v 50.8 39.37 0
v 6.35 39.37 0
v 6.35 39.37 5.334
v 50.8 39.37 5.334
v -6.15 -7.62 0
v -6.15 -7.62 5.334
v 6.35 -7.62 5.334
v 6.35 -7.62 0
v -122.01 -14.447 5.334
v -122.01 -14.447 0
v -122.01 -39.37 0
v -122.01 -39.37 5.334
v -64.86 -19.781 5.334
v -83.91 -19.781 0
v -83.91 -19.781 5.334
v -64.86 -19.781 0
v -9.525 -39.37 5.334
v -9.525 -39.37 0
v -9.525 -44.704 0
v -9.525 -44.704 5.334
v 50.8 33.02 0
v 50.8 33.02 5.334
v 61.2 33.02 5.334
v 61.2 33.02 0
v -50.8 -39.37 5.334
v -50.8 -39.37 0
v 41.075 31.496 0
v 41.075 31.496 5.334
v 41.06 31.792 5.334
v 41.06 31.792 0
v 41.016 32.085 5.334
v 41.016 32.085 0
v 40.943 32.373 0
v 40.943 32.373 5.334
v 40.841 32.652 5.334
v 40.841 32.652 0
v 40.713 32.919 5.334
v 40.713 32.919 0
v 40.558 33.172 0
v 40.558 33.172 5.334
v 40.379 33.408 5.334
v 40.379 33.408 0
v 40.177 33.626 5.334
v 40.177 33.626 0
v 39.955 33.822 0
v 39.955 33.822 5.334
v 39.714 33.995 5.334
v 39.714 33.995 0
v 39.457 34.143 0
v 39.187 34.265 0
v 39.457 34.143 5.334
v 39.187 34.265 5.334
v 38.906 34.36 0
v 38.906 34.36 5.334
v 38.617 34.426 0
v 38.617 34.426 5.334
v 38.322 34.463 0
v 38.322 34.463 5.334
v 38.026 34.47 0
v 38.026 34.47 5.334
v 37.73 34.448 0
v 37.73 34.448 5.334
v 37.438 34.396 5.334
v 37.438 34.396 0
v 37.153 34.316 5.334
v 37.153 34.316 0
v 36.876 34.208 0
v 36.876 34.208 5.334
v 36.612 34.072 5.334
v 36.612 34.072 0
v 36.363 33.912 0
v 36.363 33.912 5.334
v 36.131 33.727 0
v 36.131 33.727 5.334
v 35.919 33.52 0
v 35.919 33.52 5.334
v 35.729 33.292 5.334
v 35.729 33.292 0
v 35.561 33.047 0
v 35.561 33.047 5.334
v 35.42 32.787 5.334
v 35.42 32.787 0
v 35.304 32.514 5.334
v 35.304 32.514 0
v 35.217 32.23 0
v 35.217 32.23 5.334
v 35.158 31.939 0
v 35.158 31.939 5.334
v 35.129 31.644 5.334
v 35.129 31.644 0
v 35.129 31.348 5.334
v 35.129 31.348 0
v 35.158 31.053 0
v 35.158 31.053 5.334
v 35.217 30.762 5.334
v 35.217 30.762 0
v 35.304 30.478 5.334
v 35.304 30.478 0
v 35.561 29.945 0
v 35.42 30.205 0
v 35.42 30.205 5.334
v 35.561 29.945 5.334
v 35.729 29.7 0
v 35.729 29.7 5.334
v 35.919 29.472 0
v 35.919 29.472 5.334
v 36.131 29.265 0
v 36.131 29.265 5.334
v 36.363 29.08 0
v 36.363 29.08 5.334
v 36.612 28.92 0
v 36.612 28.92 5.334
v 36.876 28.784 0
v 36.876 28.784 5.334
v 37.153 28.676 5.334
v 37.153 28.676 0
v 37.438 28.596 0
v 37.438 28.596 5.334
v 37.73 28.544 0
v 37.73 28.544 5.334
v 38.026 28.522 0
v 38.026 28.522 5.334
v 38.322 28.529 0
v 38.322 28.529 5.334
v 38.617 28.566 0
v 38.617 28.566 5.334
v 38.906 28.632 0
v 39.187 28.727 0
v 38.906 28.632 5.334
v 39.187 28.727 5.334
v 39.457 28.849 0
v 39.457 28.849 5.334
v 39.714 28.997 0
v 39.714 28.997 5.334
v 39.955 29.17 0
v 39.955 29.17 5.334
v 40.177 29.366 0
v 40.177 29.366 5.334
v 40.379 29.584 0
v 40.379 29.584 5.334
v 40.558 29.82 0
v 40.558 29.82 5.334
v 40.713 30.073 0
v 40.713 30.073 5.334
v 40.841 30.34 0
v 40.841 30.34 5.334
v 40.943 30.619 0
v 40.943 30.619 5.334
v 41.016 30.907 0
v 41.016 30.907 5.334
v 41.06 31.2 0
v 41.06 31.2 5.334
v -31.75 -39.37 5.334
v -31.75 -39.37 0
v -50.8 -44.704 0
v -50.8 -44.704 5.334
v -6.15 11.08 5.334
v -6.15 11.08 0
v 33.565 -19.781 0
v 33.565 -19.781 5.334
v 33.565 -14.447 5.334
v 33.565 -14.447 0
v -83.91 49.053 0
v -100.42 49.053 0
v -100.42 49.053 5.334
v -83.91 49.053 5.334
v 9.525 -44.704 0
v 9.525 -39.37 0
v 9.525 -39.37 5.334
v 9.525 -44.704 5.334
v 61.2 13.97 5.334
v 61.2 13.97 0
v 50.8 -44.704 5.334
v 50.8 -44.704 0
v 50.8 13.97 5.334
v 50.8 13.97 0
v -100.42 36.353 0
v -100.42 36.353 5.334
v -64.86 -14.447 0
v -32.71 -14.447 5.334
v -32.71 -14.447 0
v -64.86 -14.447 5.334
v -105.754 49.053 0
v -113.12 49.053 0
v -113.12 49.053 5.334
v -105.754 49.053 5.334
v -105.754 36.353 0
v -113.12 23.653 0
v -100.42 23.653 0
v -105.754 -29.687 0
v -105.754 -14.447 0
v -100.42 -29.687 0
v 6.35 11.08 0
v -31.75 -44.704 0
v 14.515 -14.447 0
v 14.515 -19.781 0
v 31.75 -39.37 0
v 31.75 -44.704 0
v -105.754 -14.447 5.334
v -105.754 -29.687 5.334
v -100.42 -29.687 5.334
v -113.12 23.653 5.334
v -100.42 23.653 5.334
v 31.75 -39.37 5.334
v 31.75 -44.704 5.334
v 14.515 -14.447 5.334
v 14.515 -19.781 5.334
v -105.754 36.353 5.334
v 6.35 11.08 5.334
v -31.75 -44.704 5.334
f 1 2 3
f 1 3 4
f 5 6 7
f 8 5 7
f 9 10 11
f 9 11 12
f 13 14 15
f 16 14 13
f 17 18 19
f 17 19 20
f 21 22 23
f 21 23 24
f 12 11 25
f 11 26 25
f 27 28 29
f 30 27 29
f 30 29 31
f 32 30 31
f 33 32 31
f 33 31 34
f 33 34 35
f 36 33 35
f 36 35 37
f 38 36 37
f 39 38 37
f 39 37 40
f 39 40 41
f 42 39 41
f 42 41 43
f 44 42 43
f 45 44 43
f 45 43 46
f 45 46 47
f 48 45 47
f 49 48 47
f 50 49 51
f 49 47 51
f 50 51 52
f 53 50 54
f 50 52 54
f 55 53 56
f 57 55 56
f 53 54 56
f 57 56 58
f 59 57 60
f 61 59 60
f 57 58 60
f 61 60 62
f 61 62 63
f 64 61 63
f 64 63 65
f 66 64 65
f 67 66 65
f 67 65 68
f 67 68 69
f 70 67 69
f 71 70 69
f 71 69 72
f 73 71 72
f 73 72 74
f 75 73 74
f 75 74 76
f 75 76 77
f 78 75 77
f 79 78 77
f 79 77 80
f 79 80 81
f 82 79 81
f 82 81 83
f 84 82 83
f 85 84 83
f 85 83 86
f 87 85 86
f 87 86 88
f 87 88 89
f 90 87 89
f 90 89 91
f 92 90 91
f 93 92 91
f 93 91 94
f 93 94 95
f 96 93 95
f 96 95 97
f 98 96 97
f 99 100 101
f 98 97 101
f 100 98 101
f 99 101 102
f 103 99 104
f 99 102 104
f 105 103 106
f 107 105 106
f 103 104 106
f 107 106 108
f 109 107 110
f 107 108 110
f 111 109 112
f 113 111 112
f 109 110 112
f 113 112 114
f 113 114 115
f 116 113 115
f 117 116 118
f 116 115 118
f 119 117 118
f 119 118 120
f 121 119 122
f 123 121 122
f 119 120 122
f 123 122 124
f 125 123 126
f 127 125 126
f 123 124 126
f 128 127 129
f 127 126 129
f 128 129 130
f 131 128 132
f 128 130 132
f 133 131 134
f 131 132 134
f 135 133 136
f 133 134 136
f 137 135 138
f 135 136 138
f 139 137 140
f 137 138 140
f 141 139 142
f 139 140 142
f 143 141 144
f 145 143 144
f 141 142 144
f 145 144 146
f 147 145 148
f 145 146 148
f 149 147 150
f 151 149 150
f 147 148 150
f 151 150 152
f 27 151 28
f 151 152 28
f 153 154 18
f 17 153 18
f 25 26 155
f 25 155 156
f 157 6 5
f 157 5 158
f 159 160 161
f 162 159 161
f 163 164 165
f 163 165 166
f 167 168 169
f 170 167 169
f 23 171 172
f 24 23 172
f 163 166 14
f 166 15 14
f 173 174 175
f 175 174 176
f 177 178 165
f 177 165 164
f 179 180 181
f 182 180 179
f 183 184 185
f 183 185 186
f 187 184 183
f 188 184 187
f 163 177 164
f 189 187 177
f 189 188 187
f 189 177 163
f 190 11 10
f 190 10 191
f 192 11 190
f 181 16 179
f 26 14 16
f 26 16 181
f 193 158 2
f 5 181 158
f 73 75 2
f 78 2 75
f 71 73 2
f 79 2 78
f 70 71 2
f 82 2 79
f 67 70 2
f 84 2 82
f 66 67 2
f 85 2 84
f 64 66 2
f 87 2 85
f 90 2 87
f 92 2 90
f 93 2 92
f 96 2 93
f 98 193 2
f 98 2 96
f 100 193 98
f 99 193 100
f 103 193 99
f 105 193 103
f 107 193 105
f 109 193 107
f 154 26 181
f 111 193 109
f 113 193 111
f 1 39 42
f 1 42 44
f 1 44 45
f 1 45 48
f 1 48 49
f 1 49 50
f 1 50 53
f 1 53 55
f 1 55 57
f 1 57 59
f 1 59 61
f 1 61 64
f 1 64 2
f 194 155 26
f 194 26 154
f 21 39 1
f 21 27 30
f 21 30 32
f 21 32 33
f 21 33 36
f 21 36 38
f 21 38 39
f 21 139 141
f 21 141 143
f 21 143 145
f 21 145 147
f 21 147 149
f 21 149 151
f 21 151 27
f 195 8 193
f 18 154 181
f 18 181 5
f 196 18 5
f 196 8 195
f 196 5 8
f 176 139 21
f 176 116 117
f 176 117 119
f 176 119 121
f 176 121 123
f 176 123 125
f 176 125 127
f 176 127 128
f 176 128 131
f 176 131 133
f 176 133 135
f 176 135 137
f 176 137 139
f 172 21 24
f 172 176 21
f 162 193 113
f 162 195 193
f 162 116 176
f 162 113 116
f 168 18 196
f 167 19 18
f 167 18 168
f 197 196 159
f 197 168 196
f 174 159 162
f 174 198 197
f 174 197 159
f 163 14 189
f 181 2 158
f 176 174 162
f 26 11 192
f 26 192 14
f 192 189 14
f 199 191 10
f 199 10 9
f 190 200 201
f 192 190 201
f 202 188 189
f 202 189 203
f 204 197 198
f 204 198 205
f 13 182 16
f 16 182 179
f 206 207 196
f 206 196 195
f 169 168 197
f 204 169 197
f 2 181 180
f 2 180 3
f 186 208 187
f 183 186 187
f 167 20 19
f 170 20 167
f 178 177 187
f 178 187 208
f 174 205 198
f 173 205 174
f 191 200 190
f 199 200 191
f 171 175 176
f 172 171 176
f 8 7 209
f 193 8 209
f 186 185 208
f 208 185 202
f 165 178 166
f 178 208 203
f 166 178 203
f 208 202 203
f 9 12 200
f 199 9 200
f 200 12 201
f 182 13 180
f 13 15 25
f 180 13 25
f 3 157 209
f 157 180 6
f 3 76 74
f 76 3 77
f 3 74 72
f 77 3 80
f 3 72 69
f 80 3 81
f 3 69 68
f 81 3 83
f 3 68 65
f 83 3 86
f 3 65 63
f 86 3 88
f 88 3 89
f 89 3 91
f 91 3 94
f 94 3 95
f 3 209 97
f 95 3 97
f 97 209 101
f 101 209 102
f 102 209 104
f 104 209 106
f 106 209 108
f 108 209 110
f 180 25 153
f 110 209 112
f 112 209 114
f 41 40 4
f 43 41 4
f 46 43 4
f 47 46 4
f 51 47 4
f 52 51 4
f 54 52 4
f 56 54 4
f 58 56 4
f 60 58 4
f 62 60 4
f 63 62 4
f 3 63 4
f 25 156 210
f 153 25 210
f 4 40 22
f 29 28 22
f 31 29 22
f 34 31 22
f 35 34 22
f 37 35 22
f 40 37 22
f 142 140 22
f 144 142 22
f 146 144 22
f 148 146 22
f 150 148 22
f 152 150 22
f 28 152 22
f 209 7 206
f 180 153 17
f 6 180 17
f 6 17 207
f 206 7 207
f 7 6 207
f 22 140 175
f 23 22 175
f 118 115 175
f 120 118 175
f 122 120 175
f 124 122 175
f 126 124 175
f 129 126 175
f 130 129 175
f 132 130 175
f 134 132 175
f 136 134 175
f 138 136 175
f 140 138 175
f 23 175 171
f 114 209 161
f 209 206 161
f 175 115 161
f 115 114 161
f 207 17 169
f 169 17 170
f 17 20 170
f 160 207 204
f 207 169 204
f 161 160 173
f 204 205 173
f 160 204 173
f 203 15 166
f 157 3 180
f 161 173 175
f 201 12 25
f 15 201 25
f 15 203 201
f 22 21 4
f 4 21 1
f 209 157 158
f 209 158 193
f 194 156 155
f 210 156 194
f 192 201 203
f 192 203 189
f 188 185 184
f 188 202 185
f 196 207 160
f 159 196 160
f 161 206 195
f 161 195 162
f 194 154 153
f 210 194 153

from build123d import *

# Parameters (mm, degrees)
SKETCH2_W                   = 101.6
SKETCH2_H                   = 78.74
SQUARE_DEPTH                = 5.334
SKETCH4_R                   = 2.975000019
SKETCH4_W                   = 19.05
SKETCH4_H                   = 5.334
MOUNTING_POINTS_DEPTH       = 65.490995154
TRICUT_DEPTH                = 65.490995154
TRICUT_DEPTH_BACK           = 65.490995154
SKETCH5_W                   = 19.05
SKETCH5_H                   = 5.334
BOTTOMTEETH_DEPTH           = 5.334
SKETCH8_W                   = 5.334
SKETCH8_H                   = 19.05
GRABBERSTOP_DEPTH           = 10.4
UNOPLATFORM_DEPTH           = 5.334
SKETCH13_W                  = 19.05
SKETCH13_H                  = 5.334
BACKTOOTH_DEPTH             = 5.334
SKETCH14_W                  = 5.334
SKETCH14_H                  = 24.923365698
CIRCUITSTACKEXTENSION_DEPTH = 25.4
SKETCH16_W                  = 5.334
SKETCH16_H                  = 15.24
CIRCUITSTACKHOLDER_DEPTH    = 131.051294604
SKETCH17_W                  = 16.51
SKETCH17_H                  = 5.334
BRACES_DEPTH                = 63.5
SKETCH18_W                  = 5.334
SKETCH18_H                  = 12.7
BRACE2_DEPTH                = 12.7
SKETCH19_W                  = 7.366
SKETCH19_H                  = 5.334
BRACE3_DEPTH                = 12.7
SKETCH20_W                  = 12.499999892
SKETCH20_H                  = 18.7
ON_OFF_SWITCH_DEPTH         = 132.609742414


with BuildPart() as part:
    # Sketch2 → square (new body)
    with BuildSketch(Plane.XY):
        Rectangle(SKETCH2_W, SKETCH2_H)
    extrude(amount=SQUARE_DEPTH)

    # Sketch4 → Mounting points (cut, through all)
    with BuildSketch(Plane.XY.offset(5.334)):
        with Locations((38.1, 31.496)):
            Circle(SKETCH4_R)
        with Locations((24.040000053, -17.113634263)):
            Rectangle(SKETCH4_W, SKETCH4_H)
    extrude(amount=-MOUNTING_POINTS_DEPTH, mode=Mode.SUBTRACT)

    # Sketch3 → tricut (cut, two sides: drawn at the far end of the back side and taken through both)
    with BuildSketch(Plane.XY.offset(5.334).offset(-TRICUT_DEPTH_BACK)):
        Polygon((-207.681606875, -255.517991695), (-50.8, -39.37), (6.35, 39.37), (50.8, 39.37), (317.880124475, 39.37), (56.500793408, 505.211192735), (-469.060937942, 210.323201041), align=None)
    extrude(amount=TRICUT_DEPTH + TRICUT_DEPTH_BACK, mode=Mode.SUBTRACT)

    # Sketch5 → bottomTeeth (add)
    with BuildSketch(Plane.XZ.offset(39.37)):
        with Locations((-41.275, 2.667)):
            Rectangle(SKETCH5_W, SKETCH5_H)
        with Locations((0, 2.667)):
            Rectangle(SKETCH5_W, SKETCH5_H)
        with Locations((41.275, 2.667)):
            Rectangle(SKETCH5_W, SKETCH5_H)
    extrude(amount=BOTTOMTEETH_DEPTH)

    # Sketch8 → GrabberStop (add)
    with BuildSketch(Plane(origin=(50.8, 0, 0), x_dir=(0, 0, -1), z_dir=(1, 0, 0))):
        with Locations((-2.667, 23.495)):
            Rectangle(SKETCH8_W, SKETCH8_H)
    extrude(amount=GRABBERSTOP_DEPTH)

    # Sketch9 → UnoPlatform (add)
    with BuildSketch(Plane.XY.offset(5.334)):
        Polygon((-96.60999982, -39.37), (-50.8, -39.37), (-32.71046038, -14.446634302), (-96.60999982, -14.446634302), align=None)
    extrude(amount=-UNOPLATFORM_DEPTH)

    # Sketch13 → backTooth (cut)
    with BuildSketch(Plane(origin=(0, -14.446634302, 0), x_dir=(1, 0, 0), z_dir=(0, 1, 0))):
        with Locations((-74.38499982, -2.667)):
            Rectangle(SKETCH13_W, SKETCH13_H)
    extrude(amount=-BACKTOOTH_DEPTH, mode=Mode.SUBTRACT)

    # Sketch14 → CircuitStackExtension (add)
    with BuildSketch(Plane.ZY.offset(96.60999982)):
        with Locations((2.667, -26.908317151)):
            Rectangle(SKETCH14_W, SKETCH14_H)
    extrude(amount=CIRCUITSTACKEXTENSION_DEPTH)

    # Sketch16 → CircuitStackHolder (cut, through all)
    with BuildSketch(Plane.XY.offset(5.334)):
        with Locations((-103.08699982, -22.066634302)):
            Rectangle(SKETCH16_W, SKETCH16_H)
    extrude(amount=-CIRCUITSTACKHOLDER_DEPTH, mode=Mode.SUBTRACT)

    # Sketch17 → Braces (add)
    with BuildSketch(Plane(origin=(0, -14.446634302, 0), x_dir=(1, 0, 0), z_dir=(0, 1, 0))):
        with Locations((-92.16499982, -2.667)):
            Rectangle(SKETCH17_W, SKETCH17_H)
    extrude(amount=BRACES_DEPTH)

    # Sketch18 → Brace2 (add)
    with BuildSketch(Plane.ZY.offset(100.41999982)):
        with Locations((2.667, 30.003365698)):
            Rectangle(SKETCH18_W, SKETCH18_H)
    extrude(amount=BRACE2_DEPTH)

    # Sketch19 → Brace3 (add)
    with BuildSketch(Plane(origin=(0, 36.353365698, 0), x_dir=(1, 0, 0), z_dir=(0, 1, 0))):
        with Locations((-109.43699982, -2.667)):
            Rectangle(SKETCH19_W, SKETCH19_H)
    extrude(amount=BRACE3_DEPTH)

    # Sketch20 → On_Off Switch (cut, through all)
    with BuildSketch(Plane.XY.offset(5.334)):
        with Locations((0.100000054, 1.73)):
            Rectangle(SKETCH20_W, SKETCH20_H)
    extrude(amount=-ON_OFF_SWITCH_DEPTH, mode=Mode.SUBTRACT)


solid = part.part
